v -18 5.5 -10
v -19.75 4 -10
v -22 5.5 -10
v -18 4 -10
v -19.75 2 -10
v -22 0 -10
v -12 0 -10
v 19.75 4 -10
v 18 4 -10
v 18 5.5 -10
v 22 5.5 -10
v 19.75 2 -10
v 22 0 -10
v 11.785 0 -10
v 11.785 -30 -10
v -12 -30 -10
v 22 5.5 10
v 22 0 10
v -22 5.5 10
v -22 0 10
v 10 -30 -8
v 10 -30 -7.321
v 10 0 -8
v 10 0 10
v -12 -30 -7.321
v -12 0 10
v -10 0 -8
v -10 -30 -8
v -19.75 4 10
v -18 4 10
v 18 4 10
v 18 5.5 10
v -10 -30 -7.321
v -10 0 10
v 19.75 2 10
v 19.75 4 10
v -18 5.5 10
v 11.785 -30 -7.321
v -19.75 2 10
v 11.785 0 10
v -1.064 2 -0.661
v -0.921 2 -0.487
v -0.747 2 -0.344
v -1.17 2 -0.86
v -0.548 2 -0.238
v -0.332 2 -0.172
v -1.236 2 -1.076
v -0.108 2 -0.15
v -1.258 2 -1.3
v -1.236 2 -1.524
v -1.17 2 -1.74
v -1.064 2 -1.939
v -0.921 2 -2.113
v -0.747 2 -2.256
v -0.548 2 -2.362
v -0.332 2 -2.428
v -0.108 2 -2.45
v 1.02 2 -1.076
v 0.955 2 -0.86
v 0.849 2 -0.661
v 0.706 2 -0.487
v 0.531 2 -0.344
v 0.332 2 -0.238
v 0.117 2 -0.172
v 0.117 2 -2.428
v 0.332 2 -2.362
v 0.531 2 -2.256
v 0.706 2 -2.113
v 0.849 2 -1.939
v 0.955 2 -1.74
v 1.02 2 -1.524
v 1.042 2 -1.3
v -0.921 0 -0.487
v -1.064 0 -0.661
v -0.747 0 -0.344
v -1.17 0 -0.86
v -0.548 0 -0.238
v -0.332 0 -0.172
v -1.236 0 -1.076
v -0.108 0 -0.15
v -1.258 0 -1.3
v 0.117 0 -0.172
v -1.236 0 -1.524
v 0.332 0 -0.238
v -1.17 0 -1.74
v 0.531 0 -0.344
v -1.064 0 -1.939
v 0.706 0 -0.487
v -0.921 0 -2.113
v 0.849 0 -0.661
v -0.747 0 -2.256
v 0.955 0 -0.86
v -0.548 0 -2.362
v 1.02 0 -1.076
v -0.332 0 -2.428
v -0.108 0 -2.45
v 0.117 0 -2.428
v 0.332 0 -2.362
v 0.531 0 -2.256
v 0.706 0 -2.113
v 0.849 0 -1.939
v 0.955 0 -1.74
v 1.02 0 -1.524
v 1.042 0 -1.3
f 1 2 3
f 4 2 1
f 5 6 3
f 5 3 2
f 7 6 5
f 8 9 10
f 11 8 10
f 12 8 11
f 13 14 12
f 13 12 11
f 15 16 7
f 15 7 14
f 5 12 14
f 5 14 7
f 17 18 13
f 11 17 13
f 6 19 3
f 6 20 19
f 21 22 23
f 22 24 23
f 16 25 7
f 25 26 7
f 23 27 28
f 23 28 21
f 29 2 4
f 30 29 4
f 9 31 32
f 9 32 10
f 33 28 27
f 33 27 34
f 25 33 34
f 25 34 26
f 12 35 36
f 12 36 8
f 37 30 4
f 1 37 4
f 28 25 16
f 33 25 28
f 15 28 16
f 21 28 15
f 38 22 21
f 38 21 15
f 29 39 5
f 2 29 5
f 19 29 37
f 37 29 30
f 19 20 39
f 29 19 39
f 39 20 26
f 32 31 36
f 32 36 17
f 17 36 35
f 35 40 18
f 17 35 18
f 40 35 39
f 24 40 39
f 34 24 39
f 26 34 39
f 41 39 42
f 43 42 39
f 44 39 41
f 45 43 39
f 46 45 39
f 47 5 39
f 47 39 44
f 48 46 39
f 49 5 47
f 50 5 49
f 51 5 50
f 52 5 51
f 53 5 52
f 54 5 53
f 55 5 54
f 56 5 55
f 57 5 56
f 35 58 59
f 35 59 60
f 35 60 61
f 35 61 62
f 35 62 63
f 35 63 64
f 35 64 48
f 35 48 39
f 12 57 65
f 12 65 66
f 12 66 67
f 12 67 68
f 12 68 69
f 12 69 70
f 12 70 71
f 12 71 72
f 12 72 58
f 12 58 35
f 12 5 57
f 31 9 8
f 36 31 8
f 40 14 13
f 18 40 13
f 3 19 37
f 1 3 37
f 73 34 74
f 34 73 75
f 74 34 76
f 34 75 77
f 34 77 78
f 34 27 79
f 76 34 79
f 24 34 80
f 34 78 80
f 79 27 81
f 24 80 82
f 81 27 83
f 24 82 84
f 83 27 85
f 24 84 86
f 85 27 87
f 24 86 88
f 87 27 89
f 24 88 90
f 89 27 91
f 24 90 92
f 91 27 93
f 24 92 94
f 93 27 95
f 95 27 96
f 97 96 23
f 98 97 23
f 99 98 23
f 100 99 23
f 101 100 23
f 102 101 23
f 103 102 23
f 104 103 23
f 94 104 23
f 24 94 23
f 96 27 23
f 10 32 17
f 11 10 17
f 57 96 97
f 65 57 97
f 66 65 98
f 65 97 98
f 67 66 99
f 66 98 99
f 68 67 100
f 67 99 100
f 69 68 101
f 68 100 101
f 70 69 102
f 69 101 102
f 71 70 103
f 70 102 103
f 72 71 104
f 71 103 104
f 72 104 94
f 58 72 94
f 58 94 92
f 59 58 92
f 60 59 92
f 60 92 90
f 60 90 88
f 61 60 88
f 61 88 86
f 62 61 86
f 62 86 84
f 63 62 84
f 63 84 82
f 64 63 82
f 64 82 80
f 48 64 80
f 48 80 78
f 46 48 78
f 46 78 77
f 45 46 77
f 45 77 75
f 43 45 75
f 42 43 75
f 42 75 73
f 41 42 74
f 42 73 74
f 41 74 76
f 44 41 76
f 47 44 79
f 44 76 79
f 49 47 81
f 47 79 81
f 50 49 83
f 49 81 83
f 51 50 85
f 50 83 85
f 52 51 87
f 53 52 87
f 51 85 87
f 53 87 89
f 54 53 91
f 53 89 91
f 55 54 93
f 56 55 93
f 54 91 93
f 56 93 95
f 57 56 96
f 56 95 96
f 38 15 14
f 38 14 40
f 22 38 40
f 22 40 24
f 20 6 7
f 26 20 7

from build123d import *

# Parameters (mm, degrees)
SKETCH1_W           = 44
SKETCH1_H           = 20
BOSS_EXTRUDE1_DEPTH = 2
SKETCH2_W           = 2.25
SKETCH2_H           = 20
BOSS_EXTRUDE2_DEPTH = 2
SKETCH3_W           = 4
SKETCH3_H           = 20
BOSS_EXTRUDE3_DEPTH = 1.5
SKETCH7_W           = 20
SKETCH7_H           = 2
BOSS_EXTRUDE4_DEPTH = 30
CHAMFER1_SIZE       = 30
CHAMFER1_SIZE2      = 17.320508076
SKETCH8_R           = 1.15
CUT_EXTRUDE1_DEPTH  = 39.522720569


with BuildPart() as part:
    # Sketch1 → Boss-Extrude1 (new body)
    with BuildSketch(Plane(origin=(0, 0, 0), x_dir=(1, 0, 0), z_dir=(0, 1, 0))):
        Rectangle(SKETCH1_W, SKETCH1_H)
    extrude(amount=BOSS_EXTRUDE1_DEPTH)

    # Sketch2 → Boss-Extrude2 (add)
    with BuildSketch(Plane(origin=(0, 2, 0), x_dir=(1, 0, 0), z_dir=(0, 1, 0))):
        with Locations((-20.875, 0)):
            Rectangle(SKETCH2_W, SKETCH2_H)
        with Locations((20.875, 0)):
            Rectangle(SKETCH2_W, SKETCH2_H)
    extrude(amount=BOSS_EXTRUDE2_DEPTH)

    # Sketch3 → Boss-Extrude3 (add)
    with BuildSketch(Plane(origin=(0, 4, 0), x_dir=(1, 0, 0), z_dir=(0, 1, 0))):
        with Locations((-20, 0)):
            Rectangle(SKETCH3_W, SKETCH3_H)
        with Locations((20, 0)):
            Rectangle(SKETCH3_W, SKETCH3_H)
    extrude(amount=BOSS_EXTRUDE3_DEPTH)

    # Sketch7 → Boss-Extrude4 (add)
    with BuildSketch(Plane.XZ):
        Polygon((-12, -10), (-10, -10), (-10, -8), (-10, 10), (-12, 10), align=None)
        with Locations((0, -9)):
            Rectangle(SKETCH7_W, SKETCH7_H)
        Polygon((10, -8), (10, -10), (11.784691828, -10), (11.784691828, 10), (10, 10), align=None)
    extrude(amount=BOSS_EXTRUDE4_DEPTH)

    # Chamfer1
    chamfer1_edges = [part.edges().sort_by_distance(p)[0] for p in [
        (10.892345914, -30, 10),
        (-11, -30, 10),
    ]]
    chamfer1_side = [part.faces().sort_by_distance(p)[0] for p in [
        (-21.434646129, 2.75, 10),
    ]]
    chamfer(chamfer1_edges, length=CHAMFER1_SIZE, length2=CHAMFER1_SIZE2, reference=chamfer1_side[0])

    # Sketch8 → Cut-Extrude1 (cut, through all)
    with BuildSketch(Plane.XZ):
        with Locations(Location((-0.107654086, -1.3, 0), (0, 0, 270))):
            Circle(SKETCH8_R)
    extrude(amount=-CUT_EXTRUDE1_DEPTH, mode=Mode.SUBTRACT)


solid = part.part
